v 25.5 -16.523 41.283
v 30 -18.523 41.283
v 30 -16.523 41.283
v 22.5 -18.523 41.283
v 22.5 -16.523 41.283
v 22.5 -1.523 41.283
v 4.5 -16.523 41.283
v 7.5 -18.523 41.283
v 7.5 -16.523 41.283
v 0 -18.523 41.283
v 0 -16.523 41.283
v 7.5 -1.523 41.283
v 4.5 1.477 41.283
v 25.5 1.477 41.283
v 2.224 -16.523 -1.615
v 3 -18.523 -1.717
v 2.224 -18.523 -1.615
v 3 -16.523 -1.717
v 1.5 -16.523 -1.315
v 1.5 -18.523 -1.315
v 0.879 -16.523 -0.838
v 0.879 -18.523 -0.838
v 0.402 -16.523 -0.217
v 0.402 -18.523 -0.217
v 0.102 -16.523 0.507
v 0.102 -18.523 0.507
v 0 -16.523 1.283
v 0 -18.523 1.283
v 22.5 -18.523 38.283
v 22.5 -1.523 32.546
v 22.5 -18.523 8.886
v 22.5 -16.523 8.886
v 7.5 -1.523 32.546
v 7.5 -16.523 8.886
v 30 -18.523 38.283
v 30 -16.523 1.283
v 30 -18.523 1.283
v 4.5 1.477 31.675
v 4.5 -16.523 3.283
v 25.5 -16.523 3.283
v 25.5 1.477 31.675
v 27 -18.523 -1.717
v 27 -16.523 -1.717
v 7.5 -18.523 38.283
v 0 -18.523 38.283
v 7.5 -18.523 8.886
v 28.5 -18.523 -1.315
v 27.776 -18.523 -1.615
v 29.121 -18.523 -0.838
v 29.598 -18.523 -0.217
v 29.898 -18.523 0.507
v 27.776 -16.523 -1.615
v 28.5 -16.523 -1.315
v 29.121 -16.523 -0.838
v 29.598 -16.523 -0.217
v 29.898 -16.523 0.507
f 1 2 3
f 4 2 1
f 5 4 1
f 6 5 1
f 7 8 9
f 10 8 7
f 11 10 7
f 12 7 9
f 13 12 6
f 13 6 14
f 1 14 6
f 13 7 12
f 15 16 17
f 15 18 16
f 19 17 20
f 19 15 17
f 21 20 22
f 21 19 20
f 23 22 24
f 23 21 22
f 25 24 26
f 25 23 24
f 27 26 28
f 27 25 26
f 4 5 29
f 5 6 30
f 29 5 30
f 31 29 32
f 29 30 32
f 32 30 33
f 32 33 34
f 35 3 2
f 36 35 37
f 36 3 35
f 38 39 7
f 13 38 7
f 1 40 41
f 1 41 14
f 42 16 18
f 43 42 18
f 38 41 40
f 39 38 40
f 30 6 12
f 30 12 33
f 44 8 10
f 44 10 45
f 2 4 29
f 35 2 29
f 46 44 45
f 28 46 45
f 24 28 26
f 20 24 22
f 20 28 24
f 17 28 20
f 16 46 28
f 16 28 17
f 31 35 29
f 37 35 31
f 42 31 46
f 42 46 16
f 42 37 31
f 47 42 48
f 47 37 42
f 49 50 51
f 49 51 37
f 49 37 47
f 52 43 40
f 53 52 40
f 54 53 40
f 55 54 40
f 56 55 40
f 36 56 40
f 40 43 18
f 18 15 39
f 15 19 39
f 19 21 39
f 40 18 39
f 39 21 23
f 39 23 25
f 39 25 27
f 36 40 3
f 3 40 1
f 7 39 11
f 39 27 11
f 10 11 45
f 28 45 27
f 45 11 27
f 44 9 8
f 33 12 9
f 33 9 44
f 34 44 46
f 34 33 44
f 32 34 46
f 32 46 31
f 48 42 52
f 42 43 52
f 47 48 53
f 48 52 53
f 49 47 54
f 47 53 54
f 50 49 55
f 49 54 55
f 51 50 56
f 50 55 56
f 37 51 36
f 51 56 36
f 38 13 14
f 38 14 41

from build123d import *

# Parameters (mm, degrees)
CROQUIS2_W              = 43
CROQUIS2_H              = 30
SALIENTE_EXTRUIR1_DEPTH = 30
CROQUIS3_W              = 42.529407755
CROQUIS3_H              = 25.558495791
CORTAR_EXTRUIR1_DEPTH   = 30
CORTAR_EXTRUIR2_START   = -7.5
CORTAR_EXTRUIR2_DEPTH   = 15
CORTAR_EXTRUIR4_DEPTH   = 4.5
CORTAR_EXTRUIR5_DEPTH   = 4.5
REDONDEO1_R             = 3
CROQUIS8_W              = 15
CROQUIS8_H              = 32.397186909
CORTAR_EXTRUIR6_DEPTH   = 4.5
CROQUIS9_W              = 120.283196461
CROQUIS9_H              = 78.810135234
CORTAR_EXTRUIR7_DEPTH   = 22.5


with BuildPart() as part:
    # Croquis2 → Saliente-Extruir1 (new body)
    with BuildSketch(Plane(origin=(0, 0, 0), x_dir=(0, 0, -1), z_dir=(1, 0, 0))):
        with Locations((-19.783269962, -13.522813688)):
            Rectangle(CROQUIS2_W, CROQUIS2_H)
    extrude(amount=SALIENTE_EXTRUIR1_DEPTH)

    # Croquis3 → Cortar-Extruir1 (cut)
    with BuildSketch(Plane(origin=(30, 0, 0), x_dir=(0, 0, -1), z_dir=(1, 0, 0))):
        with Locations((-17.018566085, -31.302061584)):
            Rectangle(CROQUIS3_W, CROQUIS3_H)
        Polygon((-31.675073764, 1.477186312), (-3.283269962, -16.522813688), (1.716730038, -16.522813688), (1.716730038, 1.477186312), align=None)
    extrude(amount=-CORTAR_EXTRUIR1_DEPTH, mode=Mode.SUBTRACT)

    # Croquis4 → Cortar-Extruir2 (cut)
    with BuildSketch(Plane(origin=(30, 0, 0), x_dir=(0, 0, -1), z_dir=(1, 0, 0)).offset(CORTAR_EXTRUIR2_START)):
        Polygon((-41.283269962, -1.522813688), (-32.545919554, -1.522813688), (-8.886083053, -16.522813688), (-41.283269962, -16.522813688), align=None)
    extrude(amount=-CORTAR_EXTRUIR2_DEPTH, mode=Mode.SUBTRACT)

    # Croquis5 → Cortar-Extruir4 (cut)
    with BuildSketch(Plane(origin=(30, 0, 0), x_dir=(0, 0, -1), z_dir=(1, 0, 0))):
        Polygon((-3.283269962, -16.522813688), (-41.283269962, -16.522813688), (-41.283269962, 1.477186312), (-31.675073764, 1.477186312), align=None)
    extrude(amount=-CORTAR_EXTRUIR4_DEPTH, mode=Mode.SUBTRACT)

    # Croquis6 → Cortar-Extruir5 (cut)
    with BuildSketch(Plane.ZY):
        Polygon((3.283269962, -16.522813688), (41.283269962, -16.522813688), (41.283269962, 1.477186312), (31.675073764, 1.477186312), align=None)
    extrude(amount=-CORTAR_EXTRUIR5_DEPTH, mode=Mode.SUBTRACT)

    # Redondeo1
    redondeo1_edges = [part.edges().sort_by_distance(p)[0] for p in [
        (0, -17.522813688, -1.716730038),
        (30, -17.522813688, -1.716730038),
    ]]
    fillet(redondeo1_edges, radius=REDONDEO1_R)

    # Croquis8 → Cortar-Extruir6 (cut)
    with BuildSketch(Plane(origin=(0, -16.522813688, 0), x_dir=(1, 0, 0), z_dir=(0, 1, 0))):
        with Locations((15, -25.084676508)):
            Rectangle(CROQUIS8_W, CROQUIS8_H)
    extrude(amount=-CORTAR_EXTRUIR6_DEPTH, mode=Mode.SUBTRACT)

    # Croquis9 → Cortar-Extruir7 (cut)
    with BuildSketch(Plane.XZ.offset(18.522813688)):
        with Locations((17.6156444, 62.089659259)):
            Rectangle(CROQUIS9_W, CROQUIS9_H)
    extrude(amount=CORTAR_EXTRUIR7_DEPTH, mode=Mode.SUBTRACT)


solid = part.part
